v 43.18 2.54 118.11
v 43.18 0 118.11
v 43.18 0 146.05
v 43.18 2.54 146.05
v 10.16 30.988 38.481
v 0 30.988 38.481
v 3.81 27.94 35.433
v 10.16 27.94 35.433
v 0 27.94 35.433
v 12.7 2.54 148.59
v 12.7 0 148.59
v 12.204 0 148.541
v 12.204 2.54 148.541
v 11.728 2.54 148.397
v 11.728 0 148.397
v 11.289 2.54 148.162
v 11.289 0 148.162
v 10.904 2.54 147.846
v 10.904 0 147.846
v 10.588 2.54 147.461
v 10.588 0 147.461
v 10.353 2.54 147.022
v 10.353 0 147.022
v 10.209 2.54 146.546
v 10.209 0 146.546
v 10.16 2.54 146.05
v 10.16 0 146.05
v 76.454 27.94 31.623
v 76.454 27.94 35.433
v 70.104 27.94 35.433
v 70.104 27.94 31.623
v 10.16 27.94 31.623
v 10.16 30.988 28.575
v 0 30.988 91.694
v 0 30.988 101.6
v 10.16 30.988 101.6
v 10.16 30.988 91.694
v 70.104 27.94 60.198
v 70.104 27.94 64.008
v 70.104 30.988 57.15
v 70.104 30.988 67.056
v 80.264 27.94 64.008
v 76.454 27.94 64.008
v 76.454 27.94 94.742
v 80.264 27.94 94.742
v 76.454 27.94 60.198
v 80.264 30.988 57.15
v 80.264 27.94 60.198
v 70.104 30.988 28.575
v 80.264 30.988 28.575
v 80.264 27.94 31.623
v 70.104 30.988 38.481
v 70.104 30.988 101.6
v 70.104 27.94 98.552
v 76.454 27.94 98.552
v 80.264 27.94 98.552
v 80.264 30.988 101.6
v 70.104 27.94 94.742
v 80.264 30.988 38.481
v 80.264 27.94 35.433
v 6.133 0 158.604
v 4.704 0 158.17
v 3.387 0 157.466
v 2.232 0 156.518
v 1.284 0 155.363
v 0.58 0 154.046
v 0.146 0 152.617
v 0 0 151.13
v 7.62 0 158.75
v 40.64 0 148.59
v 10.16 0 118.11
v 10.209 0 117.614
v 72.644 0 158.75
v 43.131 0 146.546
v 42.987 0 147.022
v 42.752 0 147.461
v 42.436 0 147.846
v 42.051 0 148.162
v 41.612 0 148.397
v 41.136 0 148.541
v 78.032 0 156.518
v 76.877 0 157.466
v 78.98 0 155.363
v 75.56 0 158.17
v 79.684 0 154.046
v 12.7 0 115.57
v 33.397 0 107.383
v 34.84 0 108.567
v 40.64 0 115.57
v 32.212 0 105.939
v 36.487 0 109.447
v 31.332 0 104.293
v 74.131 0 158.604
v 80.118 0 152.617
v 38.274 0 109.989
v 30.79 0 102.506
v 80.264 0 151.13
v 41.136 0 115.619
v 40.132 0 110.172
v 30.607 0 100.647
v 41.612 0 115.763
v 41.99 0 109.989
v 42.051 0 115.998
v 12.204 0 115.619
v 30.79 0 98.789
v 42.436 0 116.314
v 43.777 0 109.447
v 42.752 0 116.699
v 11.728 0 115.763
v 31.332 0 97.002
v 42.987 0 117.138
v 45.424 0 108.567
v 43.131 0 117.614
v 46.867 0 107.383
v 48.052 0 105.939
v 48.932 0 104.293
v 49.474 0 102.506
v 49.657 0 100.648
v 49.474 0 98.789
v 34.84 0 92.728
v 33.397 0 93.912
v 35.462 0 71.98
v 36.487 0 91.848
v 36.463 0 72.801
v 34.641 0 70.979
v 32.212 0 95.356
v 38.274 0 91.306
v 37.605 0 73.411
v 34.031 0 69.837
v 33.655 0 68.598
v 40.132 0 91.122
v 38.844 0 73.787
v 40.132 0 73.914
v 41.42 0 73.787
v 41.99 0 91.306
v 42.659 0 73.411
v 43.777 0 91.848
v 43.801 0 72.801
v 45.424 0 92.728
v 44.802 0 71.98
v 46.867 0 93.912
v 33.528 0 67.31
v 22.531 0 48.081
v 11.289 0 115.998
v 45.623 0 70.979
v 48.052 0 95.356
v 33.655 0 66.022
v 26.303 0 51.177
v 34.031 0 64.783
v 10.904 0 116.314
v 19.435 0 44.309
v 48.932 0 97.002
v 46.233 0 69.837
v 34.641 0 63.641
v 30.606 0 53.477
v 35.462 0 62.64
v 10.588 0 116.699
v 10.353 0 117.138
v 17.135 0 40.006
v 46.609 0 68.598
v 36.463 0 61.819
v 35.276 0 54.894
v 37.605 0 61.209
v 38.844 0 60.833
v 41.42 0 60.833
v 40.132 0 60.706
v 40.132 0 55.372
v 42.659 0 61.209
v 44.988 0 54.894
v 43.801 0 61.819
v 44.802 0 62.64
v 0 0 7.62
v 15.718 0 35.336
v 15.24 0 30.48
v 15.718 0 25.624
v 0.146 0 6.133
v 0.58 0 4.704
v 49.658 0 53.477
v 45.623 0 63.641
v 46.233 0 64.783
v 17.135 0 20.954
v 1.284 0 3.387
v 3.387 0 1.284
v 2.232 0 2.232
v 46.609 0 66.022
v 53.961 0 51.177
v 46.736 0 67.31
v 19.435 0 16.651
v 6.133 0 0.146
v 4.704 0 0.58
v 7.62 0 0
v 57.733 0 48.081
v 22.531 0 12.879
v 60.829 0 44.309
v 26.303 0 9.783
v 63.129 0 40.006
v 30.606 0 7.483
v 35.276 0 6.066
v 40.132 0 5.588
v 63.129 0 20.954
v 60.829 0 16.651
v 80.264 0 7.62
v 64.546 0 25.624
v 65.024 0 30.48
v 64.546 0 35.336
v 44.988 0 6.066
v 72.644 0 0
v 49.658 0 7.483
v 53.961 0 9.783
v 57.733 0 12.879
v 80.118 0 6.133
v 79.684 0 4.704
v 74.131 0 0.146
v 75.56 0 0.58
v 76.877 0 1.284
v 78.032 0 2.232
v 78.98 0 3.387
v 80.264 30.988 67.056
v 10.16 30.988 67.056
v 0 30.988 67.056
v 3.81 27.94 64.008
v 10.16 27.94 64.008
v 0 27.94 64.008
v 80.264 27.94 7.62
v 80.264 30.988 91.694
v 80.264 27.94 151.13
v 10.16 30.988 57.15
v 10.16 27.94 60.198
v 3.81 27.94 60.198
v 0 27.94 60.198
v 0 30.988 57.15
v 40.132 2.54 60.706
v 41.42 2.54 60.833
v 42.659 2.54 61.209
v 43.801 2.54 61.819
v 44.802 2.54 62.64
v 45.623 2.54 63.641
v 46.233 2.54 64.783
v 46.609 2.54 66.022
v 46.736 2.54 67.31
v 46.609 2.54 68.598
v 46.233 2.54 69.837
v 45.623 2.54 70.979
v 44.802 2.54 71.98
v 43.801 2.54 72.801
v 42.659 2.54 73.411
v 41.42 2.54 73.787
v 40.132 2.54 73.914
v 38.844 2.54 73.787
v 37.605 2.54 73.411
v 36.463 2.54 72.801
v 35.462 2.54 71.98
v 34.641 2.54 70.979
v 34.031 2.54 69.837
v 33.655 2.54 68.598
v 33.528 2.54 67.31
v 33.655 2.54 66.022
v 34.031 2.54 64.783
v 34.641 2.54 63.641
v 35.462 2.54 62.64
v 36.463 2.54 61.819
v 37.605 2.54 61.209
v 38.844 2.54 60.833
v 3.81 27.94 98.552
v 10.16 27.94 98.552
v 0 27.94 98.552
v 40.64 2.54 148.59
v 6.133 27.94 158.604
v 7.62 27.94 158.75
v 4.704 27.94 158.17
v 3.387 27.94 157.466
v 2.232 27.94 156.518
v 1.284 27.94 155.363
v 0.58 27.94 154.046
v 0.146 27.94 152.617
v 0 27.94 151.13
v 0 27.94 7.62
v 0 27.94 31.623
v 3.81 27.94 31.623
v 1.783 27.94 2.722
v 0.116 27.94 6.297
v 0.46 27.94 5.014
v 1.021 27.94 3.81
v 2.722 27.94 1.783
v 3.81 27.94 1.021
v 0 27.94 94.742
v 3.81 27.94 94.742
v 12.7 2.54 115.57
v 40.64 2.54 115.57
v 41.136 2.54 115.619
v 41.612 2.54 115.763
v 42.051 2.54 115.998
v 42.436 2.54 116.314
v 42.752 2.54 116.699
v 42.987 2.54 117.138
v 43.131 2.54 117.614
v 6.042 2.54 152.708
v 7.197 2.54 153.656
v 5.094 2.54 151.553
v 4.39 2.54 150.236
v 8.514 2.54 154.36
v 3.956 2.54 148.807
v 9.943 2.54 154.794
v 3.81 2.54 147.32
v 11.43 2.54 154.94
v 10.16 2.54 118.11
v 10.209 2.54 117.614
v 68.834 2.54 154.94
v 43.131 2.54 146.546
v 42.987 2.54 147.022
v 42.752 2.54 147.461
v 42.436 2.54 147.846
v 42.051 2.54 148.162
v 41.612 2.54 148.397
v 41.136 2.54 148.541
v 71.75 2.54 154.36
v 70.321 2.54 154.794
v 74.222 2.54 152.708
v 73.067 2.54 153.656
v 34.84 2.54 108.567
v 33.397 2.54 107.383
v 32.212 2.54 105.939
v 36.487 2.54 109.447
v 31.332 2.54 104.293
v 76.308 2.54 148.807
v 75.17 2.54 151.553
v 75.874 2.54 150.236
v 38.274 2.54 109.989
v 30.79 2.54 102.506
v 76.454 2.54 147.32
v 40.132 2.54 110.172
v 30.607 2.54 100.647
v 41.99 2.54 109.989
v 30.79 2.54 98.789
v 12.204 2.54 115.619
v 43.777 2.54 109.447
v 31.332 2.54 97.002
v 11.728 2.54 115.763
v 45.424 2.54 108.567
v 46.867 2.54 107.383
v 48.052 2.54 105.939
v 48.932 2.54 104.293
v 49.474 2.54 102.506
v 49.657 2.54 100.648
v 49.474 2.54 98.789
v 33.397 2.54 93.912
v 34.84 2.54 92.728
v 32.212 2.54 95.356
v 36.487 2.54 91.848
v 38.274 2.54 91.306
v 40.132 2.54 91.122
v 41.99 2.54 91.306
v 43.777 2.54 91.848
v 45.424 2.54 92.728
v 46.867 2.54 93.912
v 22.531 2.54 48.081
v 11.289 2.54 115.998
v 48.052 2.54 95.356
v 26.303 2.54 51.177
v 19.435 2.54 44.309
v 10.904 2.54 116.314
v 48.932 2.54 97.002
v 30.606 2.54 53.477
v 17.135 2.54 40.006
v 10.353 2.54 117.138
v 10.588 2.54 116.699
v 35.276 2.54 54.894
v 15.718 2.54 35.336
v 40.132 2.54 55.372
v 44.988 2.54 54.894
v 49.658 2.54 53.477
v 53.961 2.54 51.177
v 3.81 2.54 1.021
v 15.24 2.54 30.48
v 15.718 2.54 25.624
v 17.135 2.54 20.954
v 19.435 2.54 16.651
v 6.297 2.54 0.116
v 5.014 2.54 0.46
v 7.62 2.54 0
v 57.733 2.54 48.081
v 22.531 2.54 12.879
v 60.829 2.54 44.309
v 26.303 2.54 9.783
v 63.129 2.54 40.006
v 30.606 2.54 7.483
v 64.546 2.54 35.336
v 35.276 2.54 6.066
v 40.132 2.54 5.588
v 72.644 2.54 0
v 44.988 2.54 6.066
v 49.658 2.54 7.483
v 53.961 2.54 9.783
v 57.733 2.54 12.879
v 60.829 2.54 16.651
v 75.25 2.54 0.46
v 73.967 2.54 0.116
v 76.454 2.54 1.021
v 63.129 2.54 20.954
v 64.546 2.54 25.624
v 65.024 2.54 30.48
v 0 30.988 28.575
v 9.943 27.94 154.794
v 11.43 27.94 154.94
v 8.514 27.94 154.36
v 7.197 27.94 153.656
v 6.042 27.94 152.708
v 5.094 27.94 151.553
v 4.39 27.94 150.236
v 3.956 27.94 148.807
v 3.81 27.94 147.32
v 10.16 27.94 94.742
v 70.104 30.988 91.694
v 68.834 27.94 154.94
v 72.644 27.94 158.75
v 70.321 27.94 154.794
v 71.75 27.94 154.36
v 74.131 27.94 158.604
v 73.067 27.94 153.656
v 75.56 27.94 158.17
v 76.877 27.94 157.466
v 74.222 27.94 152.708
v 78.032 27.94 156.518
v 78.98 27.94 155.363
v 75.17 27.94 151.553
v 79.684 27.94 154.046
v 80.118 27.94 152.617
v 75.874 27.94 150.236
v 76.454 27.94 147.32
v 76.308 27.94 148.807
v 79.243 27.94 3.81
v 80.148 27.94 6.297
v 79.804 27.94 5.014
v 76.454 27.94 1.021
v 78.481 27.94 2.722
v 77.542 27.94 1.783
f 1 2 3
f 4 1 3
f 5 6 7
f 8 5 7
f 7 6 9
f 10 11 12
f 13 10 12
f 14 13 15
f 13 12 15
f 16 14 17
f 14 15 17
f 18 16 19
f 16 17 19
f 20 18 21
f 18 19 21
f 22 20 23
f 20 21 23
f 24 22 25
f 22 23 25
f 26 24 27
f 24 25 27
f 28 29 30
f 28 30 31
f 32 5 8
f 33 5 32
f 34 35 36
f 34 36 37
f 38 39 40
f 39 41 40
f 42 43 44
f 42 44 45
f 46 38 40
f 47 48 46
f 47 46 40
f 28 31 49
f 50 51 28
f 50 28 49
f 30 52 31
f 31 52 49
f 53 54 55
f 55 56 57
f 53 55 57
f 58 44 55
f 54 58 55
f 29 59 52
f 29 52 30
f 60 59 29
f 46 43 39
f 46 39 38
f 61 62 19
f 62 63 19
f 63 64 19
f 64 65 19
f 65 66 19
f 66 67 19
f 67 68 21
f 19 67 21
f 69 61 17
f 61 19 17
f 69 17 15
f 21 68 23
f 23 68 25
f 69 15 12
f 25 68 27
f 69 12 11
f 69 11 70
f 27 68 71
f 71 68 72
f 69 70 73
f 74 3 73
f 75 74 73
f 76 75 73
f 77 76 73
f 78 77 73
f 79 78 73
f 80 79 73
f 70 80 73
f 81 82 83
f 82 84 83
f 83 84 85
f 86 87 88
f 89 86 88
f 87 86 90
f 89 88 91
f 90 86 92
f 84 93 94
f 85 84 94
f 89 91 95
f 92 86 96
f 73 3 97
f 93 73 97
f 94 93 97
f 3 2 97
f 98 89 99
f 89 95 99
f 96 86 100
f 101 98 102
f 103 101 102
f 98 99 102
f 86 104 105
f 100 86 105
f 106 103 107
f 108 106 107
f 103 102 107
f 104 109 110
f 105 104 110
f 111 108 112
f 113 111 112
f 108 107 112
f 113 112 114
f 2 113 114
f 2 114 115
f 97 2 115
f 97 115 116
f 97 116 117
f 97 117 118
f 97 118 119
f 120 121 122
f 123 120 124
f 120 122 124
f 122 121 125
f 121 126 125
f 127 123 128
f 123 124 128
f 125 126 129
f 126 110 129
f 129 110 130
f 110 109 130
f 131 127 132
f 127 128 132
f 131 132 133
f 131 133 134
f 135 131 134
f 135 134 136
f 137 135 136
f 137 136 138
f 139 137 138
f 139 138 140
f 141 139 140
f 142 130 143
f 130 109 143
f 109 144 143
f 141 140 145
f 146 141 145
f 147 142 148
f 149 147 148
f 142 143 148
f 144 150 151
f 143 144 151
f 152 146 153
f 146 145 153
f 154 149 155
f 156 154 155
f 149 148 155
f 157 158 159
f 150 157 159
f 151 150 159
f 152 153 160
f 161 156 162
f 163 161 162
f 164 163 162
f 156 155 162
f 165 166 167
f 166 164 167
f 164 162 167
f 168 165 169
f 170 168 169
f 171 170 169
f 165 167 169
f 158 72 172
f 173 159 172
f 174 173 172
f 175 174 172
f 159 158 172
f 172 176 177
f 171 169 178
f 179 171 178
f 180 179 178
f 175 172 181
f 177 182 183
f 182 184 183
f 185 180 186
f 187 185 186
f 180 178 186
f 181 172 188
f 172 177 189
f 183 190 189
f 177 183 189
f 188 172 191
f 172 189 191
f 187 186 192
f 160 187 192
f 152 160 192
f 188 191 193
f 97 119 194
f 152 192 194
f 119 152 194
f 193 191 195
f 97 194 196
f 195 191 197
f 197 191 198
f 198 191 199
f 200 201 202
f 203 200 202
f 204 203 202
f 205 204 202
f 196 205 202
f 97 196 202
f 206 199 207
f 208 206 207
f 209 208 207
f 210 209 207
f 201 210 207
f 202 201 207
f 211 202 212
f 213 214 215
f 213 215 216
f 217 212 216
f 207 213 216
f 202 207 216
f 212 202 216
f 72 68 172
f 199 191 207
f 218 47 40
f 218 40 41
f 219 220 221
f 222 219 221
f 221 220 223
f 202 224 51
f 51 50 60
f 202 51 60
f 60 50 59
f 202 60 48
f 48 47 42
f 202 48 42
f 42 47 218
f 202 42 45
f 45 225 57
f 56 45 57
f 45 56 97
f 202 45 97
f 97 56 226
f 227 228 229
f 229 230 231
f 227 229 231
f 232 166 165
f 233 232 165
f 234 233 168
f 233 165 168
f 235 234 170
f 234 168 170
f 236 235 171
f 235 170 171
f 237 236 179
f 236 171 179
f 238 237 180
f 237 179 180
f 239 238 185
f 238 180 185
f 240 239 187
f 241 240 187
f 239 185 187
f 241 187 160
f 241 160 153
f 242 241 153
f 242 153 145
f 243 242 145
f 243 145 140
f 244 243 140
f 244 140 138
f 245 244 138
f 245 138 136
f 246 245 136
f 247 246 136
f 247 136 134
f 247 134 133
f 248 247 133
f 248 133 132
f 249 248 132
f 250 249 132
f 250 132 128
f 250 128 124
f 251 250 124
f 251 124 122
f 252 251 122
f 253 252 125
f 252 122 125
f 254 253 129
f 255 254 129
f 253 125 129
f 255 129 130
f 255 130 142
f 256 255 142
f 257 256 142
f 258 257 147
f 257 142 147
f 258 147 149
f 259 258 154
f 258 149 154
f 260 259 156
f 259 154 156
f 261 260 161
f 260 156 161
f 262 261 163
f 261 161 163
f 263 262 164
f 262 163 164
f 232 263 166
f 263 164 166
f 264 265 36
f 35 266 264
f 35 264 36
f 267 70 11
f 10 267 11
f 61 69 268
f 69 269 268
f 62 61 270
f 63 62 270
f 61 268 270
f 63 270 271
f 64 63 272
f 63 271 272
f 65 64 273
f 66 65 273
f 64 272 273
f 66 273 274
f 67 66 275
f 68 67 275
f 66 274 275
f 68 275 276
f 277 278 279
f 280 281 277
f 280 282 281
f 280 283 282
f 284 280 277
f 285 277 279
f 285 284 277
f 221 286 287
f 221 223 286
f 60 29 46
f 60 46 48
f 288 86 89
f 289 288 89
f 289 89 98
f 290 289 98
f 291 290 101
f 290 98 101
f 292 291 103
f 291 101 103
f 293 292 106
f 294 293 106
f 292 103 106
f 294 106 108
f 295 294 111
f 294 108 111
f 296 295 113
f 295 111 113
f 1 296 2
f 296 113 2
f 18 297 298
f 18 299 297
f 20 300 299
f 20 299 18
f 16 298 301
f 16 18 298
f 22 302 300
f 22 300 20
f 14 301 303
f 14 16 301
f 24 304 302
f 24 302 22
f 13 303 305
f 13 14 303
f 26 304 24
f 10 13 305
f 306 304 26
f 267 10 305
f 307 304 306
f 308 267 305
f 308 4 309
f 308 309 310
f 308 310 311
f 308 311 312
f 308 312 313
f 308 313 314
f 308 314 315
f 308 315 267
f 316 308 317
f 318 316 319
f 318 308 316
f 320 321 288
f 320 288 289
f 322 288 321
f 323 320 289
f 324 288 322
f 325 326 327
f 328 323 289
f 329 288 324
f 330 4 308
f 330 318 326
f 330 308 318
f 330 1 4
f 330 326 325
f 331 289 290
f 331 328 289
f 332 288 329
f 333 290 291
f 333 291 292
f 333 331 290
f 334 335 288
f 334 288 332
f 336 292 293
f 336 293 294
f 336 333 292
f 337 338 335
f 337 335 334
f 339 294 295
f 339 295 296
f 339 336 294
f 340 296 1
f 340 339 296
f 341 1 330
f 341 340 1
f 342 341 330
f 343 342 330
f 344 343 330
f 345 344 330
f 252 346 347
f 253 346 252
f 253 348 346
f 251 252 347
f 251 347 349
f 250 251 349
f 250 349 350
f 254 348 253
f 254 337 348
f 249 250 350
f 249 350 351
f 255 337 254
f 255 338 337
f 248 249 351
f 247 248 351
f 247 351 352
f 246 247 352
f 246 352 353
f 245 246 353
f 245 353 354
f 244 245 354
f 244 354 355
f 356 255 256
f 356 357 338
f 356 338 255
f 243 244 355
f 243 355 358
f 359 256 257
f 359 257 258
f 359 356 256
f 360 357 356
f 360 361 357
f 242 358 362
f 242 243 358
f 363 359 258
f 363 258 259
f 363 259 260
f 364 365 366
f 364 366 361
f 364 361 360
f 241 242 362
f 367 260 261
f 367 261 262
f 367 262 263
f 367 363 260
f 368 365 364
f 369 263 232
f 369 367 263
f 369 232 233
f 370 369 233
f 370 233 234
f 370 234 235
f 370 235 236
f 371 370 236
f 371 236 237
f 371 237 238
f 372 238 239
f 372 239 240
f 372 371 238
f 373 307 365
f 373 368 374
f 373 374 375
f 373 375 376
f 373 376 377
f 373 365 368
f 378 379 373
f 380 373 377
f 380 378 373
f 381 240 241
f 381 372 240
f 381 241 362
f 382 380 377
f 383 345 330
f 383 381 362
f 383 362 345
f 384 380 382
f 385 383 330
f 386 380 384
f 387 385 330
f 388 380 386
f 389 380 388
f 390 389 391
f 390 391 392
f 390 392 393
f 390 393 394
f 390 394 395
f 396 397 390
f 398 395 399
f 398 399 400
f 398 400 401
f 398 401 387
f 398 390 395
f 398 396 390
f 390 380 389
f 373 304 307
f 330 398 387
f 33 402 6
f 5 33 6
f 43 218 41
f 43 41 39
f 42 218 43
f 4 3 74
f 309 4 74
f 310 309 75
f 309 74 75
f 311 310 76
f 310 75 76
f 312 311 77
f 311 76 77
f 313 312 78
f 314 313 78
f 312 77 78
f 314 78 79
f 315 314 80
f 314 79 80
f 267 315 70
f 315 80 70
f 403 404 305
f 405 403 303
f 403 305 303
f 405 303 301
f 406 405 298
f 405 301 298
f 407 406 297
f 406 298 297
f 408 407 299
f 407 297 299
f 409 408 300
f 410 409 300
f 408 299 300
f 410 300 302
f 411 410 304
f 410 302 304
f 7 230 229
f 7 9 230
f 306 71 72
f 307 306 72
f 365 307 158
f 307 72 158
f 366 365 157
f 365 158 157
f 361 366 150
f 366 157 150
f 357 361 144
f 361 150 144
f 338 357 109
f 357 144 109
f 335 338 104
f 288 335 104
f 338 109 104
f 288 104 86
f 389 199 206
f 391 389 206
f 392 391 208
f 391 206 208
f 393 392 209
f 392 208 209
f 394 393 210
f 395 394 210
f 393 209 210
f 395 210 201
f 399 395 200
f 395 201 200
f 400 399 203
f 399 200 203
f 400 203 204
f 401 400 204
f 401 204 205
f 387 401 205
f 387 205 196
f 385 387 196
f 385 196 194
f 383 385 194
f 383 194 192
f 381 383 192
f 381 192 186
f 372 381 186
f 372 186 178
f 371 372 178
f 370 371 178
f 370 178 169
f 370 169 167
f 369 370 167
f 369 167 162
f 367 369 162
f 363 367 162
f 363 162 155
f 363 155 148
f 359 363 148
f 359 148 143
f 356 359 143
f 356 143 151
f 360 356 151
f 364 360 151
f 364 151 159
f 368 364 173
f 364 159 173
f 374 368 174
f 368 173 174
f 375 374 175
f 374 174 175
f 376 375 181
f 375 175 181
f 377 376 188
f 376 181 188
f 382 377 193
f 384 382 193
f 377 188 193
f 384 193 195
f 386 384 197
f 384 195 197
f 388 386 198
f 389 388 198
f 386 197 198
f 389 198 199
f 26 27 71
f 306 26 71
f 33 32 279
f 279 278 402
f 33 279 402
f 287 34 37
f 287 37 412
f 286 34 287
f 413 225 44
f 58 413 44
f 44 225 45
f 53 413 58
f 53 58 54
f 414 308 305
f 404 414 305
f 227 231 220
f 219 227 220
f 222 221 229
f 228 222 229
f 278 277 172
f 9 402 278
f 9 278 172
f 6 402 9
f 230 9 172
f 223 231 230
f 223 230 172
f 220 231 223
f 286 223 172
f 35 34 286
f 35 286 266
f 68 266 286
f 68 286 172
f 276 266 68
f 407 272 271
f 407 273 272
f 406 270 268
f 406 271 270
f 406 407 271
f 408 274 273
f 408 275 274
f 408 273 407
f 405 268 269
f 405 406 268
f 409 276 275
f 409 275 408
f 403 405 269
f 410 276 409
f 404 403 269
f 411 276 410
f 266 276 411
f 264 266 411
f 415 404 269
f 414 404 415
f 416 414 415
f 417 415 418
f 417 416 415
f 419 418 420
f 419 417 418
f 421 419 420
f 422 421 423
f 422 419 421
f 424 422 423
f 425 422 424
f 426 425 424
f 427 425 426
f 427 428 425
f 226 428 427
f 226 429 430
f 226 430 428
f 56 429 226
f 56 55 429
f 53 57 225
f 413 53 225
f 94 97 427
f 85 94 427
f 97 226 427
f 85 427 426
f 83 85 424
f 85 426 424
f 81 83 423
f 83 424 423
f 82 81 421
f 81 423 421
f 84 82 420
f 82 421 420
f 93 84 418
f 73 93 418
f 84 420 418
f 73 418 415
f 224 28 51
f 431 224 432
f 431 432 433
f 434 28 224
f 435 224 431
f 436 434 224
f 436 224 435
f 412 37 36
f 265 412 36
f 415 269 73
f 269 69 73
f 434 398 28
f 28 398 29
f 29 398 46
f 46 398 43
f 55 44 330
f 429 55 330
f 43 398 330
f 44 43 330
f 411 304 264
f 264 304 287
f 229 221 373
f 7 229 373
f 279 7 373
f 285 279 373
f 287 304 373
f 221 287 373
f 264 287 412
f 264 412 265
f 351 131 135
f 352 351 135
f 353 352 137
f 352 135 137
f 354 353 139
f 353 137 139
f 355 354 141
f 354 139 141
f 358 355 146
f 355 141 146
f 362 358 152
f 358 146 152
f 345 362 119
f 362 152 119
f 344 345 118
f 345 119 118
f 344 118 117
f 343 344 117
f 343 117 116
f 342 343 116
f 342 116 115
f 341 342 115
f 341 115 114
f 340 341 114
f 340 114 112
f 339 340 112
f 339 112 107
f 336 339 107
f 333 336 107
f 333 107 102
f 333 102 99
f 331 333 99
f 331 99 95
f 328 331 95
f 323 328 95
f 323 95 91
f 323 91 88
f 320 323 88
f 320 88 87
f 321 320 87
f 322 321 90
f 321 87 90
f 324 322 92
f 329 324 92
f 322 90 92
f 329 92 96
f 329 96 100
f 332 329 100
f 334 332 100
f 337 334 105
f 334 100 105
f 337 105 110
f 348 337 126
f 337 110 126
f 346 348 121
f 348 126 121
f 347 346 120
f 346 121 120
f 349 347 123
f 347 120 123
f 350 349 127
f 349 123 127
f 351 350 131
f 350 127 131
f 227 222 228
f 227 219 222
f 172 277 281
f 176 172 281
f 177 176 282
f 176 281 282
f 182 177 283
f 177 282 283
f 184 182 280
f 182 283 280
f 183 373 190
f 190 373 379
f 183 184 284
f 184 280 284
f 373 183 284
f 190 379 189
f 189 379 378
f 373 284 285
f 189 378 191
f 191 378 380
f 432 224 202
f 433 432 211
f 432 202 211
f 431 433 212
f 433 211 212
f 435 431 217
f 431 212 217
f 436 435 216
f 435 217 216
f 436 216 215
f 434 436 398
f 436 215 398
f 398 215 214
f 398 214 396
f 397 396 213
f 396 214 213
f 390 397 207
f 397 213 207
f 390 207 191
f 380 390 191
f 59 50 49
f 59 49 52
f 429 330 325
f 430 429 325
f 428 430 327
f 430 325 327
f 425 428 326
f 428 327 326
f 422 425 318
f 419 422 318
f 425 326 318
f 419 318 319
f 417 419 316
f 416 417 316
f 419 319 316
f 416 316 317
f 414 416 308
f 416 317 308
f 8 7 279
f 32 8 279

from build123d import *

# Parameters (mm, degrees)
SKETCH1_W           = 80.264
SKETCH1_H           = 158.75
BOSS_EXTRUDE1_DEPTH = 2.54
BOSS_EXTRUDE2_DEPTH = 25.4
FILLET1_R           = 7.62
SKETCH7_R           = 6.604
SKETCH7_R_2         = 9.525
SKETCH7_R_3         = 24.892
CUT_EXTRUDE1_DEPTH  = 181.068086556
BOSS_EXTRUDE3_DEPTH = 10.16


with BuildPart() as part:
    # Sketch1 → Boss-Extrude1 (new body)
    with BuildSketch(Plane(origin=(0, 0, 0), x_dir=(1, 0, 0), z_dir=(0, 1, 0))):
        with Locations((40.132, -79.375)):
            Rectangle(SKETCH1_W, SKETCH1_H)
    extrude(amount=BOSS_EXTRUDE1_DEPTH)

    # Sketch2 → Boss-Extrude2 (add)
    with BuildSketch(Plane(origin=(0, 2.54, 0), x_dir=(1, 0, 0), z_dir=(0, 1, 0))):
        with BuildLine():
            Line((3.81, -147.32), (3.81, -11.43))
            Line((3.81, -11.43), (3.81, 0))
            Line((3.81, 0), (0, 0))
            Line((0, 0), (0, -158.75))
            Line((0, -158.75), (80.264, -158.75))
            Line((80.264, -158.75), (80.264, 0))
            Line((80.264, 0), (76.454, 0))
            Line((76.454, 0), (76.454, -11.43))
            Line((76.454, -11.43), (76.454, -147.32))
            ThreePointArc((76.454, -147.32), (74.222153673, -152.708153673), (68.834, -154.94))
            Line((68.834, -154.94), (11.43, -154.94))
            ThreePointArc((11.43, -154.94), (6.041846327, -152.708153673), (3.81, -147.32))
        make_face()
    extrude(amount=BOSS_EXTRUDE2_DEPTH)

    # Fillet1
    fillet1_edges = [part.edges().sort_by_distance(p)[0] for p in [
        (0, 13.97, 0),
        (80.264, 13.97, 0),
        (80.264, 13.97, 158.75),
        (0, 13.97, 158.75),
    ]]
    fillet(fillet1_edges, radius=FILLET1_R)

    # Sketch7 → Cut-Extrude1 (cut, through all)
    with BuildSketch(Plane.XZ):
        with Locations(Location((40.132, 67.31, 0), (0, 0, 270))):
            Circle(SKETCH7_R)
        with Locations(Location((40.132, 100.6475, 0), (0, 0, 270))):
            Circle(SKETCH7_R_2)
        with Locations(Location((40.132, 30.48, 0), (0, 0, 270))):
            Circle(SKETCH7_R_3)
        with BuildLine():
            Line((40.64, 148.59), (12.7, 148.59))
            ThreePointArc((12.7, 148.59), (10.903948776, 147.846051224), (10.16, 146.05))
            Line((10.16, 146.05), (10.16, 118.11))
            ThreePointArc((10.16, 118.11), (10.903948776, 116.313948776), (12.7, 115.57))
            Line((12.7, 115.57), (40.64, 115.57))
            ThreePointArc((40.64, 115.57), (42.436051224, 116.313948776), (43.18, 118.11))
            Line((43.18, 118.11), (43.18, 146.05))
            ThreePointArc((43.18, 146.05), (42.436051224, 147.846051224), (40.64, 148.59))
        make_face()
    extrude(amount=-CUT_EXTRUDE1_DEPTH, mode=Mode.SUBTRACT)

    # Sketch8 → Boss-Extrude3 (add)
    with BuildSketch(Plane(origin=(80.264, 0, 0), x_dir=(0, 0, -1), z_dir=(1, 0, 0))):
        Polygon((-98.552, 27.94), (-101.6, 30.988), (-91.694, 30.988), (-94.742, 27.94), align=None)
        Polygon((-64.008, 27.94), (-60.198, 27.94), (-57.15, 30.988), (-67.056, 30.988), align=None)
        Polygon((-38.481, 30.988), (-35.433, 27.94), (-31.623, 27.94), (-28.575, 30.988), align=None)
    boss_extrude3 = extrude(amount=-BOSS_EXTRUDE3_DEPTH)

    # Mirror3: Boss-Extrude3 across plane
    add(boss_extrude3.mirror(Plane(origin=(40.132, 0, 0), x_dir=(0, 0, 1), z_dir=(1, 0, 0))))


solid = part.part
